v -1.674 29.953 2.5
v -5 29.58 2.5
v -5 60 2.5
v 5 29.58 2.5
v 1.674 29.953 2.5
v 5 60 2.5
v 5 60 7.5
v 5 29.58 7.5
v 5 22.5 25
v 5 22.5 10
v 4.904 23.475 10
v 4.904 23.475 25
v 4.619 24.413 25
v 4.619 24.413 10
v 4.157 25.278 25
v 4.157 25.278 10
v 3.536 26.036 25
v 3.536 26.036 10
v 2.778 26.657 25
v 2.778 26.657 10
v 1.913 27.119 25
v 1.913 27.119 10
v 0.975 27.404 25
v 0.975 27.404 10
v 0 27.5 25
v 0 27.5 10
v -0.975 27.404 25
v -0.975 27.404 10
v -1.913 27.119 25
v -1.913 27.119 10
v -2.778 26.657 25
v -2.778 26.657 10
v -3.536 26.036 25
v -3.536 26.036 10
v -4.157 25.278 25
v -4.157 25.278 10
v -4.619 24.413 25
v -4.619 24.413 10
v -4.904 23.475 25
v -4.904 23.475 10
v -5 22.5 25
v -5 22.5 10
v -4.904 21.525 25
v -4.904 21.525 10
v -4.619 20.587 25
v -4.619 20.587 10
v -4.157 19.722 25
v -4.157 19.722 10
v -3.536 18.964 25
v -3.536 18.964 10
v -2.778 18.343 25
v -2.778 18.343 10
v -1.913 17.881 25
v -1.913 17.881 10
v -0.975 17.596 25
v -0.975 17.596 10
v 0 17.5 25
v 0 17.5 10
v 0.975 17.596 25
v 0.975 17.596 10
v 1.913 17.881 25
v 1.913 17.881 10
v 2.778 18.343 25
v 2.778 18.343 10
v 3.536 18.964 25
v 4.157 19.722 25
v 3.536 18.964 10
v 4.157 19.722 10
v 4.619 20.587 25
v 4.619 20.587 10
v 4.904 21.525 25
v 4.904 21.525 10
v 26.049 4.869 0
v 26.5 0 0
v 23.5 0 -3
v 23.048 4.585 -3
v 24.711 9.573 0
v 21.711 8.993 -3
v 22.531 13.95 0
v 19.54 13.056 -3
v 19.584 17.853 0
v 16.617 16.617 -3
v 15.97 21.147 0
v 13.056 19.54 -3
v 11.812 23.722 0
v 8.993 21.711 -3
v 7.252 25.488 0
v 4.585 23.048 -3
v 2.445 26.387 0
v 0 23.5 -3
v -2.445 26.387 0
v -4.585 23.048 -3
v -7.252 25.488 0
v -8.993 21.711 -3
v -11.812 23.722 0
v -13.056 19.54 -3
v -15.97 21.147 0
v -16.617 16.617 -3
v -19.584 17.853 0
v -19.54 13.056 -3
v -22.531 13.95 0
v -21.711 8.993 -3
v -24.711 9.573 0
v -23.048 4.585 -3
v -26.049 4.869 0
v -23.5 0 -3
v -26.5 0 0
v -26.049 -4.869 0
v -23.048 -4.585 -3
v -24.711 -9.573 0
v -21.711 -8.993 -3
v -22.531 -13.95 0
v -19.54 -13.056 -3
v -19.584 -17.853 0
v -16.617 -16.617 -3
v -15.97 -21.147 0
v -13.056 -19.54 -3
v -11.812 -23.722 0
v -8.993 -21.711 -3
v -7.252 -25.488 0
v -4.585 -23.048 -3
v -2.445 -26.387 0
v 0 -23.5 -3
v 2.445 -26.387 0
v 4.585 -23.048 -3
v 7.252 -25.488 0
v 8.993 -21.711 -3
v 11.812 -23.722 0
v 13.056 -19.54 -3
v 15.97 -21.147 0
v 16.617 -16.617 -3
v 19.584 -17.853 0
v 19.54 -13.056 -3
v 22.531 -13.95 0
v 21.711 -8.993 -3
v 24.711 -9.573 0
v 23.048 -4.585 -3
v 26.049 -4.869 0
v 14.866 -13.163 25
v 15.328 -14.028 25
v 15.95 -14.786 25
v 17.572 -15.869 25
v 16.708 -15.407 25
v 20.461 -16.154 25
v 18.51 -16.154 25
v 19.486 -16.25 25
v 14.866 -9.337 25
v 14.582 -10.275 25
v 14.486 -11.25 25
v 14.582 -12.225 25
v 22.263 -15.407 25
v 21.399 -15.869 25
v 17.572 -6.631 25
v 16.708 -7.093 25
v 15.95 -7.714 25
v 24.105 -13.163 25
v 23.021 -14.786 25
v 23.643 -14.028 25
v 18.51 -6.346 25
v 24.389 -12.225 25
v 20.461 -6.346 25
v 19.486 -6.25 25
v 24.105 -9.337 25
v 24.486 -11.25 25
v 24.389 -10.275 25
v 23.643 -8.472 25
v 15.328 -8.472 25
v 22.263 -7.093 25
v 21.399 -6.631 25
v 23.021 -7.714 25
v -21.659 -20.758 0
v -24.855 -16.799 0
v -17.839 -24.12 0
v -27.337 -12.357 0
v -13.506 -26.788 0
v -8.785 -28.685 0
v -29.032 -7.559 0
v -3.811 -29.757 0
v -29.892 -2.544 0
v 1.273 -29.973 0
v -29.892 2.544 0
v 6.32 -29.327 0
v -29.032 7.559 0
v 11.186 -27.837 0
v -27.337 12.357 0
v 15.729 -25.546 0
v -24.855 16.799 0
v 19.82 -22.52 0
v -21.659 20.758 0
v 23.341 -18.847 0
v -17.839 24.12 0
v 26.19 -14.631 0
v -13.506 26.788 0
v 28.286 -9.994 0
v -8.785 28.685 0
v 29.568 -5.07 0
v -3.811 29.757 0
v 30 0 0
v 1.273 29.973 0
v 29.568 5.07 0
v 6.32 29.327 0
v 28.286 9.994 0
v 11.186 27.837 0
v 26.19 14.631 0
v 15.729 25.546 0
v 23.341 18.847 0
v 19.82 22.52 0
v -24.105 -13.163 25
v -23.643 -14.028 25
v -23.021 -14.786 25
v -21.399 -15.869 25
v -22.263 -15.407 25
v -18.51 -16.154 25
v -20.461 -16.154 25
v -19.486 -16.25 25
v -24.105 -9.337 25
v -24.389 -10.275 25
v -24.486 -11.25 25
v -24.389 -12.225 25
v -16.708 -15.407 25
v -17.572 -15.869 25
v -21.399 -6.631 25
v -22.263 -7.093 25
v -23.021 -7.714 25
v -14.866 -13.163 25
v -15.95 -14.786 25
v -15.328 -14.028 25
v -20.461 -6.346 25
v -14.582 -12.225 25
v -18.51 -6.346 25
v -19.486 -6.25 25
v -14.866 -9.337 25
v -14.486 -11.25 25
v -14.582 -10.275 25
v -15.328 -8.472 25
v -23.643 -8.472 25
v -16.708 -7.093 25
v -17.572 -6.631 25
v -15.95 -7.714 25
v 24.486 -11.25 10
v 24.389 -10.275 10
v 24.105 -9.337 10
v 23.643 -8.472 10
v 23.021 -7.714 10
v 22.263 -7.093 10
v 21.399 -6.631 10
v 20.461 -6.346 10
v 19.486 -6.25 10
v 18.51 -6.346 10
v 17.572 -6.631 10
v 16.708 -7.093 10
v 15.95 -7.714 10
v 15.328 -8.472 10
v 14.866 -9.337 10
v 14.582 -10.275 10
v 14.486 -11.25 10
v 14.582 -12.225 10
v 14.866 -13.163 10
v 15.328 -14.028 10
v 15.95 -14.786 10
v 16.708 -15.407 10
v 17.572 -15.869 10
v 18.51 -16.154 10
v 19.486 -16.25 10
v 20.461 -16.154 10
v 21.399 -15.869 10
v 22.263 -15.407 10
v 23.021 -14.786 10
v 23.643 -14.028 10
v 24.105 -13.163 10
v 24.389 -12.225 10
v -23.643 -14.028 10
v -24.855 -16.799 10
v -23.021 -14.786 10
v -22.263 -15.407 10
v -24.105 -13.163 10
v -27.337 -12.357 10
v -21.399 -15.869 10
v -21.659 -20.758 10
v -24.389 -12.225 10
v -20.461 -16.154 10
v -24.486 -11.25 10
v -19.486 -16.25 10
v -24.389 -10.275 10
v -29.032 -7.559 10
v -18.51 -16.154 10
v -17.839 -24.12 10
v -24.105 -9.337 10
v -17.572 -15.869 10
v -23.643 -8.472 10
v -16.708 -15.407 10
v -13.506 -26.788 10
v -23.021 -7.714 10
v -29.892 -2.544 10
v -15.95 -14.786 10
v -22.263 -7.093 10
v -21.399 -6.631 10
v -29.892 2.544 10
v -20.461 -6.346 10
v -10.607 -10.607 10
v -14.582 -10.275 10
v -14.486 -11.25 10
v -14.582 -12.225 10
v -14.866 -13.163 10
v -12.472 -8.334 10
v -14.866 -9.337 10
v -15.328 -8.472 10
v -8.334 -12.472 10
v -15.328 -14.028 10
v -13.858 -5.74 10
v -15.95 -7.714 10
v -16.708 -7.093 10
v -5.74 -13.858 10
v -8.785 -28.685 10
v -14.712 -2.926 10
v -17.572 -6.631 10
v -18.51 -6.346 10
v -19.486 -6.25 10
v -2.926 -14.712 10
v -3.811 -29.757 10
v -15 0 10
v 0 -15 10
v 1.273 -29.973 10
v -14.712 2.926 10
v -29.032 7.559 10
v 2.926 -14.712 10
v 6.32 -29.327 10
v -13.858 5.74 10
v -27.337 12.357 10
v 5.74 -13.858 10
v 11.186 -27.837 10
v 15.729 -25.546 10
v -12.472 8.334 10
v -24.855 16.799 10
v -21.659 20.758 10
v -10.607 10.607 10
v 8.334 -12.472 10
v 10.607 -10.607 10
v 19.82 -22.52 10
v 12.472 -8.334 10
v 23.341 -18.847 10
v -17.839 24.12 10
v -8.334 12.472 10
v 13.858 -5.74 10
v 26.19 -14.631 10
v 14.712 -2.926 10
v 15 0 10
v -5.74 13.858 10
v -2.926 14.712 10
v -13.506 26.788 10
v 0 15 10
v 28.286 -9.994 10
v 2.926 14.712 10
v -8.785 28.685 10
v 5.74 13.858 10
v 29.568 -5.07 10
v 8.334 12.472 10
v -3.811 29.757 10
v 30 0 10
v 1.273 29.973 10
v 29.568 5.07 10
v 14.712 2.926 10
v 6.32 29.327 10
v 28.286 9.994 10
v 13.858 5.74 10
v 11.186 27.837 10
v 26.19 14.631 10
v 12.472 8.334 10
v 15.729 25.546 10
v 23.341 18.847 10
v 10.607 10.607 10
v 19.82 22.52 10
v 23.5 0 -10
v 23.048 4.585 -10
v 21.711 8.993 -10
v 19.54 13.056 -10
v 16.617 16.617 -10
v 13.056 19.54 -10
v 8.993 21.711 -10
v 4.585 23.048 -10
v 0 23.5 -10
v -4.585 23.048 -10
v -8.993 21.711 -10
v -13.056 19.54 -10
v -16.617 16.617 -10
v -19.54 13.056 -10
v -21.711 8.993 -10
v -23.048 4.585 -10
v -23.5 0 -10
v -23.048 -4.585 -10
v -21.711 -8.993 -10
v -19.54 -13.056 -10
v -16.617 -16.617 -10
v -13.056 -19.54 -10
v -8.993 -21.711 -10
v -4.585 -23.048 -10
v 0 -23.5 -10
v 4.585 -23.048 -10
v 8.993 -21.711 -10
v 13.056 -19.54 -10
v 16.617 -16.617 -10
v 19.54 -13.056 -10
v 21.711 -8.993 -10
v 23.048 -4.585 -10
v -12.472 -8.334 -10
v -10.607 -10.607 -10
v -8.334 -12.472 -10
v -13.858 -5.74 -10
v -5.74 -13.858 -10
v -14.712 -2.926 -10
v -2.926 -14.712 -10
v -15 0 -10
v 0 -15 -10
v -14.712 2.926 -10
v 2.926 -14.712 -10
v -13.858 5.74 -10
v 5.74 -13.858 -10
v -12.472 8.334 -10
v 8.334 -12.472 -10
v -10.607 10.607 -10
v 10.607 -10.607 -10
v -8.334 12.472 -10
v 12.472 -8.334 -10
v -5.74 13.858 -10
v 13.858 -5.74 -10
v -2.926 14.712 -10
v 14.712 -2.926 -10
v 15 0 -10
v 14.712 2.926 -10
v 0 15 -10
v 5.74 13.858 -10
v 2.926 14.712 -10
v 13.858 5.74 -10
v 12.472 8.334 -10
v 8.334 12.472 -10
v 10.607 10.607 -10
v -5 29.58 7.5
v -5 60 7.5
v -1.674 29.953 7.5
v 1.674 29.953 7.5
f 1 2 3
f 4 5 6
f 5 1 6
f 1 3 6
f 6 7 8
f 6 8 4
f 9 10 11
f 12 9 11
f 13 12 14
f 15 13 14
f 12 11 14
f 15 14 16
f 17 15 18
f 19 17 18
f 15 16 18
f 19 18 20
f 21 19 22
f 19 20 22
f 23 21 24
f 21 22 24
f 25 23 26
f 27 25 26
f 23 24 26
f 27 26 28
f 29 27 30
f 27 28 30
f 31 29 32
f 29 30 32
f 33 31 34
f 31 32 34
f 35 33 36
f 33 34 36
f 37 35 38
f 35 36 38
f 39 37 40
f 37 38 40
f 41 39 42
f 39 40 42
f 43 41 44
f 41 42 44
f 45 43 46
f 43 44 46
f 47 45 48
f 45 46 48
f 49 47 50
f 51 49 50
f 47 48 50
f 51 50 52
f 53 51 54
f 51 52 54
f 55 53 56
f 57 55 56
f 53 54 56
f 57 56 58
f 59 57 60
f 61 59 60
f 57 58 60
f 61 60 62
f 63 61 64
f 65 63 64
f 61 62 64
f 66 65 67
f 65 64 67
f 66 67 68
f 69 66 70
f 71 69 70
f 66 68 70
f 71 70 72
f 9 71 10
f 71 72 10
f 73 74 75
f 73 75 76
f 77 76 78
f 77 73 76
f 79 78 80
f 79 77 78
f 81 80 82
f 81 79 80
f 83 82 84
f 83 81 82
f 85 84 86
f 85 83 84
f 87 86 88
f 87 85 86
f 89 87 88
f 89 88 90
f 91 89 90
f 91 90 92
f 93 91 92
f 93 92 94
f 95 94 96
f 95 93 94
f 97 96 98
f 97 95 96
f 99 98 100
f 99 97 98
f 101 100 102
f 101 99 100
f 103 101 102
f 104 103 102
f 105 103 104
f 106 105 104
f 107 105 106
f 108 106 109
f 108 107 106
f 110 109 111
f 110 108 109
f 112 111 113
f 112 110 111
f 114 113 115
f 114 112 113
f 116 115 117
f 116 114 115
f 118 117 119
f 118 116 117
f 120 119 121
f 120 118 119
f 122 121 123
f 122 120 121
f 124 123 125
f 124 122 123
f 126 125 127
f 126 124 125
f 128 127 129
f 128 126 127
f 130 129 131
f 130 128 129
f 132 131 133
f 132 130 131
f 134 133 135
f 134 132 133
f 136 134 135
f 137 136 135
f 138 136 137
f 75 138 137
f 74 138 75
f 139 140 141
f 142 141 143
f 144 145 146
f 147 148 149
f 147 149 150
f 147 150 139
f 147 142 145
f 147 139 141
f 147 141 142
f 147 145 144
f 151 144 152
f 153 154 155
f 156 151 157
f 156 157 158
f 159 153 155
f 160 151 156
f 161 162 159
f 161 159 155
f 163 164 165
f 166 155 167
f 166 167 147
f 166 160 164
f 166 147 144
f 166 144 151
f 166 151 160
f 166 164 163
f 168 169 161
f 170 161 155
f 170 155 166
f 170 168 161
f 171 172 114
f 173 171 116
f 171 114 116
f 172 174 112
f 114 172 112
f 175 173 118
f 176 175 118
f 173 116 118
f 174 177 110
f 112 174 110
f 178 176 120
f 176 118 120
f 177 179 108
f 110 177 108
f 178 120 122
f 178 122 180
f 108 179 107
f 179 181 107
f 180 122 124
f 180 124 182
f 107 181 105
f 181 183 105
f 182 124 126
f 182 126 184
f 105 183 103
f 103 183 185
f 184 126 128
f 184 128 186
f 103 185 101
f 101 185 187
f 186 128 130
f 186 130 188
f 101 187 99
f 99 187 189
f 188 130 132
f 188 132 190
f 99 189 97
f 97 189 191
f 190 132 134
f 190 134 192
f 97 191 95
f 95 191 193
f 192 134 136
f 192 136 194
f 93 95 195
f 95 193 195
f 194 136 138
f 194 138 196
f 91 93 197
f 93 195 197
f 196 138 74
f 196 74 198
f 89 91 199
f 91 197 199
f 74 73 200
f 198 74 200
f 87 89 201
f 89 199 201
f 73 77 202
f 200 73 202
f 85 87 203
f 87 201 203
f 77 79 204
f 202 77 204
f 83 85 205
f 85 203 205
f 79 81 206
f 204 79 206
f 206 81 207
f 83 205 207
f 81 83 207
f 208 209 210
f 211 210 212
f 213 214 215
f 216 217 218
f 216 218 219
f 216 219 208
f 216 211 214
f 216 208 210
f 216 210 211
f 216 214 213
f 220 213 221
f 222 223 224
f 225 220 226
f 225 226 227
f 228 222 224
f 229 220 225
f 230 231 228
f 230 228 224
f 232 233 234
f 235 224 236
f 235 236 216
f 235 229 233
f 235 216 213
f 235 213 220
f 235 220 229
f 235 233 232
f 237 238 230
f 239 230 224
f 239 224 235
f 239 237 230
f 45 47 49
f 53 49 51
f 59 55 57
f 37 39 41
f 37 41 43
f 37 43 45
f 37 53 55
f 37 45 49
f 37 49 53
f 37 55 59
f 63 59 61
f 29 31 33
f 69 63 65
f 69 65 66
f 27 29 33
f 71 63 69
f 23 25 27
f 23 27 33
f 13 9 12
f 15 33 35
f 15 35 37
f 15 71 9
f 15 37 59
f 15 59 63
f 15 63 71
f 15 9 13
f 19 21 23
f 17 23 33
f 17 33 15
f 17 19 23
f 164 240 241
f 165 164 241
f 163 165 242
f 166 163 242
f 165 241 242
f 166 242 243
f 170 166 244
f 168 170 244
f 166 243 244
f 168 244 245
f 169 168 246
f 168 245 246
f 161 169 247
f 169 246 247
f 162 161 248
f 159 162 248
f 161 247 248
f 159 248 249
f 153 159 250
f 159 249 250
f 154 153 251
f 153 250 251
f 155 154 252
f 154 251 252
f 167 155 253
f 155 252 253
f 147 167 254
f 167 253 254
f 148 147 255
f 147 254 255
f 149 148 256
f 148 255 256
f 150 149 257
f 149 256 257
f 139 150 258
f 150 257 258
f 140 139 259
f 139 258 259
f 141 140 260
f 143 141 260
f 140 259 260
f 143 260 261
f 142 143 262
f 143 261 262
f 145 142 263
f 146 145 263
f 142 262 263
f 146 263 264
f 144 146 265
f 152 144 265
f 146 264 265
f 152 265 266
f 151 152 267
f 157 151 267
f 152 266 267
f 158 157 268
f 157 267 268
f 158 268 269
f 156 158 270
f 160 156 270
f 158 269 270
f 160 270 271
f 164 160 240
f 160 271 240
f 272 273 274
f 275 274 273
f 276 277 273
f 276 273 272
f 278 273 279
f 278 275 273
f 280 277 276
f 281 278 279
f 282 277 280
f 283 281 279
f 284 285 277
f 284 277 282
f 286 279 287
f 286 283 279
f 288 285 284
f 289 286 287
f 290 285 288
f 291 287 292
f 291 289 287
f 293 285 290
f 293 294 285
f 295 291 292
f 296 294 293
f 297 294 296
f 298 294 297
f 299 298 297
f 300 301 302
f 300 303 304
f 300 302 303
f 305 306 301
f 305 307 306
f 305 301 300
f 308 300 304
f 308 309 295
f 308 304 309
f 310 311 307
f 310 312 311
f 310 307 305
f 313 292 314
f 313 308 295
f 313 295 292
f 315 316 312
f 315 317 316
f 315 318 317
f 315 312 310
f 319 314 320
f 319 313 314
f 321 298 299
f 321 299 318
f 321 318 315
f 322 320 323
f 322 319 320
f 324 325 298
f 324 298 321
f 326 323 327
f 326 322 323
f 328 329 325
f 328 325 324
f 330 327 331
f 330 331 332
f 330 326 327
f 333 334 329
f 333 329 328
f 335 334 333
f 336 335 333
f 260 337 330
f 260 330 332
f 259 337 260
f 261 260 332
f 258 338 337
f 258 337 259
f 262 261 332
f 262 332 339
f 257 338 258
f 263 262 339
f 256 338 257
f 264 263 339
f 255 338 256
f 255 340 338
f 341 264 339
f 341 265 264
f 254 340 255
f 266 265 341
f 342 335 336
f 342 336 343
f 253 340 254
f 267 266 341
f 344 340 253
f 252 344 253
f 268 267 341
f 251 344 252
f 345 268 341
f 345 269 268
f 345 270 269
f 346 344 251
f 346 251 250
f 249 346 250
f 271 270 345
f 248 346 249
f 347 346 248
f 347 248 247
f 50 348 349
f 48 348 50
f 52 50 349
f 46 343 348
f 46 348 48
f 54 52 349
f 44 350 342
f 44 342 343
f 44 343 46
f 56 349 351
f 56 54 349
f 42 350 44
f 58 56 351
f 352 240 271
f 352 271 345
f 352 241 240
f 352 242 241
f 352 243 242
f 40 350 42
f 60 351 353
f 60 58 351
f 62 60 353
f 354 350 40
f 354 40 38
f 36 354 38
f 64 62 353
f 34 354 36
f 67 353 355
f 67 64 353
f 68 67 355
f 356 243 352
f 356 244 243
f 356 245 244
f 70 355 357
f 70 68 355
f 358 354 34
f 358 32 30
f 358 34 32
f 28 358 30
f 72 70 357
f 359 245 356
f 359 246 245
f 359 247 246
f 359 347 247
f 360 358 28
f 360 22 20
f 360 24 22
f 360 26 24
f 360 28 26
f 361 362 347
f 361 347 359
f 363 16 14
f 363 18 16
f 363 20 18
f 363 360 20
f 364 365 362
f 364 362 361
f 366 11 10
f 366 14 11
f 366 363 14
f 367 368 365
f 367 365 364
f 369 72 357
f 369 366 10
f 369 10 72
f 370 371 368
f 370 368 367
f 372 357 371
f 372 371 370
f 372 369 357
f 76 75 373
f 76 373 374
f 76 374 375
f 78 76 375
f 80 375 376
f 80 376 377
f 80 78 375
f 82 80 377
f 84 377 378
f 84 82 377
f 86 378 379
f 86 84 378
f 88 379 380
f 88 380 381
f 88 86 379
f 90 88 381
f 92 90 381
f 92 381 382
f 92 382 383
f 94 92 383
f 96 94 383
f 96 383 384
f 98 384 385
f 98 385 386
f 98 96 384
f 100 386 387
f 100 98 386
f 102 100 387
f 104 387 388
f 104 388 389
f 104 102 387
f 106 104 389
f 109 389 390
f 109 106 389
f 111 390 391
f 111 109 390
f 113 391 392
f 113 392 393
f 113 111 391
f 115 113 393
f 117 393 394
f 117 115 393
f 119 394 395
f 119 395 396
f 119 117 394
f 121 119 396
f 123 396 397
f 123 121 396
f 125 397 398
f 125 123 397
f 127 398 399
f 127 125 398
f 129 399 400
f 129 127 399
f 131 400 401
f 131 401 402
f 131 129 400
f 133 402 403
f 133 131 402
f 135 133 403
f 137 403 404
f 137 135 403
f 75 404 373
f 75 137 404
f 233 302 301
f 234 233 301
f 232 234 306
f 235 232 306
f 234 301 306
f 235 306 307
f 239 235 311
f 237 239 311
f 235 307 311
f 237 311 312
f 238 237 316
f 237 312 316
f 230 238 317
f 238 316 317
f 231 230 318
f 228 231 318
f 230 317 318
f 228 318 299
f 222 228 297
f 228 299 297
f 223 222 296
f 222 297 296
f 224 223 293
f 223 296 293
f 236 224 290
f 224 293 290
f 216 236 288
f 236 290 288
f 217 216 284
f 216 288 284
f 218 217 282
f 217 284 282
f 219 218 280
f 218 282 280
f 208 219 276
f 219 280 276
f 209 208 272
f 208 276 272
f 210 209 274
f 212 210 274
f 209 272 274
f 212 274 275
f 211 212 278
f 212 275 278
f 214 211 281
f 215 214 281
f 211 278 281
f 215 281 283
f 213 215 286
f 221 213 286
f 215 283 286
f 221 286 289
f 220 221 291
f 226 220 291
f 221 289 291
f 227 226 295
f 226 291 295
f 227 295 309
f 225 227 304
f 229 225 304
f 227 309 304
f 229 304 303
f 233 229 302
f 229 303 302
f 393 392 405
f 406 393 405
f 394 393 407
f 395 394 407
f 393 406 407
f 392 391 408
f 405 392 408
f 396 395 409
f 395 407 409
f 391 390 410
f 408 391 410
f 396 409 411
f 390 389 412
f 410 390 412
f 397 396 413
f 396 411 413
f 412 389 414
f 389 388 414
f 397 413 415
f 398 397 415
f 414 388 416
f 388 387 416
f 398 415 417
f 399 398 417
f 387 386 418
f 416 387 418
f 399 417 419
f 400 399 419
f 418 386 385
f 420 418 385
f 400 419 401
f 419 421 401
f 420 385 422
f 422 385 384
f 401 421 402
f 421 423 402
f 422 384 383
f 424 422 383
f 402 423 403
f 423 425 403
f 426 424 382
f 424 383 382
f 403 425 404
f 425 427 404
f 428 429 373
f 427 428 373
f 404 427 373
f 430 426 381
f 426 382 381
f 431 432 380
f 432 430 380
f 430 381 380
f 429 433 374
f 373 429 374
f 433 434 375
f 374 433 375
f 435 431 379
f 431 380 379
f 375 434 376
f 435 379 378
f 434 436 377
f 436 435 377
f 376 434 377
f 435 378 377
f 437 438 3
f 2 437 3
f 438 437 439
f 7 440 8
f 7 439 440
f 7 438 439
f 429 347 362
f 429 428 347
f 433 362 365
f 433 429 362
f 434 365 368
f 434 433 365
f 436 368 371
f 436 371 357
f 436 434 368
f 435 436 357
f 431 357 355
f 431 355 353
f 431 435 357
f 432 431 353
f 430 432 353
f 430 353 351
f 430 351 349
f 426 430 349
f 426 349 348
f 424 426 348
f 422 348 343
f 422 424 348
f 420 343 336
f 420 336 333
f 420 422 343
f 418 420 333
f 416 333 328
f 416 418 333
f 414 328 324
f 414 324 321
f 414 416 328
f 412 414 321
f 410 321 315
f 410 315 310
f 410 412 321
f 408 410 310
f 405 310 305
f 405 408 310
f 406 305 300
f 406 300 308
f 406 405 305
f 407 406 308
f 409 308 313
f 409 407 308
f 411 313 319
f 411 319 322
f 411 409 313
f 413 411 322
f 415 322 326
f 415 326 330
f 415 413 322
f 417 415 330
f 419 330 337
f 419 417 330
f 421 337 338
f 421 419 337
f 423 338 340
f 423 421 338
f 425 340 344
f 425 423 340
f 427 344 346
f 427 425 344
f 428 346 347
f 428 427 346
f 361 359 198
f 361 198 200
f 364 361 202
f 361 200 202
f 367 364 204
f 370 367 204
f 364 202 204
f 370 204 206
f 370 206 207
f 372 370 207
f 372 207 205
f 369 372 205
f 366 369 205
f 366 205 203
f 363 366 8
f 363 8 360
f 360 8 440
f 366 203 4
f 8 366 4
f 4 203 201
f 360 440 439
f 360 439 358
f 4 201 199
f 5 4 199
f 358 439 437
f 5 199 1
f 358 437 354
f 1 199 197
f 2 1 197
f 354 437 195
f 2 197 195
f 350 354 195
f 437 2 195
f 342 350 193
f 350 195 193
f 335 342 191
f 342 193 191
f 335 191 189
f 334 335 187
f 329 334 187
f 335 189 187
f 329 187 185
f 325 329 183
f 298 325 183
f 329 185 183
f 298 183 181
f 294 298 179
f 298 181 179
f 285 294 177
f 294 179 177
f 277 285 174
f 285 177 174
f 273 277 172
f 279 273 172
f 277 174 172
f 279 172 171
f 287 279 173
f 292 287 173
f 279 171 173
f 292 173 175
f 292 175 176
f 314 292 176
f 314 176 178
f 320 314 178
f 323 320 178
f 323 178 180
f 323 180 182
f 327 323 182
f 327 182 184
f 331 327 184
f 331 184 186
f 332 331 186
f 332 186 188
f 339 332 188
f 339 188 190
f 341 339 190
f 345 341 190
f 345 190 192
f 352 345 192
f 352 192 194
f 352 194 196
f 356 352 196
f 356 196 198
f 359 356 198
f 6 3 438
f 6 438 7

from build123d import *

# Parameters (mm, degrees)
SKETCH1_R                = 23.5
SKETCH1_R_2              = 15
BOSS_EXTRUDE1_DEPTH      = 10
SKETCH2_R                = 30
SKETCH2_R_2              = 15
BOSS_EXTRUDE2_DEPTH      = 10
CHAMFER1_SIZE            = 3
SKETCH3_R                = 5
BOSS_EXTRUDE3_DEPTH      = 15
SKETCH4_W                = 10
SKETCH4_H                = 5
BOSS_EXTRUDE5_DEPTH      = 30
BOSS_EXTRUDE5_DEPTH_BACK = 3


with BuildPart() as part:
    # Sketch1 → Boss-Extrude1 (new body)
    with BuildSketch(Plane.XY):
        Circle(SKETCH1_R)
        Circle(SKETCH1_R_2, mode=Mode.SUBTRACT)
    extrude(amount=-BOSS_EXTRUDE1_DEPTH)

    # Sketch2 → Boss-Extrude2 (add)
    with BuildSketch(Plane.XY):
        Circle(SKETCH2_R)
        Circle(SKETCH2_R_2, mode=Mode.SUBTRACT)
    extrude(amount=BOSS_EXTRUDE2_DEPTH)

    # Chamfer1
    chamfer1_edges = [part.edges().sort_by_distance(p)[0] for p in [
        (-23.5, 0, 0),
    ]]
    chamfer(chamfer1_edges, length=CHAMFER1_SIZE)

    # Sketch3 → Boss-Extrude3 (add)
    with BuildSketch(Plane.XY.offset(10)):
        with Locations((0, 22.5)):
            Circle(SKETCH3_R)
        with Locations((19.485571585, -11.25)):
            Circle(SKETCH3_R)
        with Locations((-19.485571585, -11.25)):
            Circle(SKETCH3_R)
    extrude(amount=BOSS_EXTRUDE3_DEPTH)

    # Sketch4 → Boss-Extrude5 (add, two sides)
    with BuildSketch(Plane(origin=(0, 30, 0), x_dir=(1, 0, 0), z_dir=(0, 1, 0))) as boss_extrude5_sk:
        with Locations((0, -5)):
            Rectangle(SKETCH4_W, SKETCH4_H)
    extrude(amount=BOSS_EXTRUDE5_DEPTH)
    extrude(boss_extrude5_sk.sketch, amount=-BOSS_EXTRUDE5_DEPTH_BACK)


solid = part.part
